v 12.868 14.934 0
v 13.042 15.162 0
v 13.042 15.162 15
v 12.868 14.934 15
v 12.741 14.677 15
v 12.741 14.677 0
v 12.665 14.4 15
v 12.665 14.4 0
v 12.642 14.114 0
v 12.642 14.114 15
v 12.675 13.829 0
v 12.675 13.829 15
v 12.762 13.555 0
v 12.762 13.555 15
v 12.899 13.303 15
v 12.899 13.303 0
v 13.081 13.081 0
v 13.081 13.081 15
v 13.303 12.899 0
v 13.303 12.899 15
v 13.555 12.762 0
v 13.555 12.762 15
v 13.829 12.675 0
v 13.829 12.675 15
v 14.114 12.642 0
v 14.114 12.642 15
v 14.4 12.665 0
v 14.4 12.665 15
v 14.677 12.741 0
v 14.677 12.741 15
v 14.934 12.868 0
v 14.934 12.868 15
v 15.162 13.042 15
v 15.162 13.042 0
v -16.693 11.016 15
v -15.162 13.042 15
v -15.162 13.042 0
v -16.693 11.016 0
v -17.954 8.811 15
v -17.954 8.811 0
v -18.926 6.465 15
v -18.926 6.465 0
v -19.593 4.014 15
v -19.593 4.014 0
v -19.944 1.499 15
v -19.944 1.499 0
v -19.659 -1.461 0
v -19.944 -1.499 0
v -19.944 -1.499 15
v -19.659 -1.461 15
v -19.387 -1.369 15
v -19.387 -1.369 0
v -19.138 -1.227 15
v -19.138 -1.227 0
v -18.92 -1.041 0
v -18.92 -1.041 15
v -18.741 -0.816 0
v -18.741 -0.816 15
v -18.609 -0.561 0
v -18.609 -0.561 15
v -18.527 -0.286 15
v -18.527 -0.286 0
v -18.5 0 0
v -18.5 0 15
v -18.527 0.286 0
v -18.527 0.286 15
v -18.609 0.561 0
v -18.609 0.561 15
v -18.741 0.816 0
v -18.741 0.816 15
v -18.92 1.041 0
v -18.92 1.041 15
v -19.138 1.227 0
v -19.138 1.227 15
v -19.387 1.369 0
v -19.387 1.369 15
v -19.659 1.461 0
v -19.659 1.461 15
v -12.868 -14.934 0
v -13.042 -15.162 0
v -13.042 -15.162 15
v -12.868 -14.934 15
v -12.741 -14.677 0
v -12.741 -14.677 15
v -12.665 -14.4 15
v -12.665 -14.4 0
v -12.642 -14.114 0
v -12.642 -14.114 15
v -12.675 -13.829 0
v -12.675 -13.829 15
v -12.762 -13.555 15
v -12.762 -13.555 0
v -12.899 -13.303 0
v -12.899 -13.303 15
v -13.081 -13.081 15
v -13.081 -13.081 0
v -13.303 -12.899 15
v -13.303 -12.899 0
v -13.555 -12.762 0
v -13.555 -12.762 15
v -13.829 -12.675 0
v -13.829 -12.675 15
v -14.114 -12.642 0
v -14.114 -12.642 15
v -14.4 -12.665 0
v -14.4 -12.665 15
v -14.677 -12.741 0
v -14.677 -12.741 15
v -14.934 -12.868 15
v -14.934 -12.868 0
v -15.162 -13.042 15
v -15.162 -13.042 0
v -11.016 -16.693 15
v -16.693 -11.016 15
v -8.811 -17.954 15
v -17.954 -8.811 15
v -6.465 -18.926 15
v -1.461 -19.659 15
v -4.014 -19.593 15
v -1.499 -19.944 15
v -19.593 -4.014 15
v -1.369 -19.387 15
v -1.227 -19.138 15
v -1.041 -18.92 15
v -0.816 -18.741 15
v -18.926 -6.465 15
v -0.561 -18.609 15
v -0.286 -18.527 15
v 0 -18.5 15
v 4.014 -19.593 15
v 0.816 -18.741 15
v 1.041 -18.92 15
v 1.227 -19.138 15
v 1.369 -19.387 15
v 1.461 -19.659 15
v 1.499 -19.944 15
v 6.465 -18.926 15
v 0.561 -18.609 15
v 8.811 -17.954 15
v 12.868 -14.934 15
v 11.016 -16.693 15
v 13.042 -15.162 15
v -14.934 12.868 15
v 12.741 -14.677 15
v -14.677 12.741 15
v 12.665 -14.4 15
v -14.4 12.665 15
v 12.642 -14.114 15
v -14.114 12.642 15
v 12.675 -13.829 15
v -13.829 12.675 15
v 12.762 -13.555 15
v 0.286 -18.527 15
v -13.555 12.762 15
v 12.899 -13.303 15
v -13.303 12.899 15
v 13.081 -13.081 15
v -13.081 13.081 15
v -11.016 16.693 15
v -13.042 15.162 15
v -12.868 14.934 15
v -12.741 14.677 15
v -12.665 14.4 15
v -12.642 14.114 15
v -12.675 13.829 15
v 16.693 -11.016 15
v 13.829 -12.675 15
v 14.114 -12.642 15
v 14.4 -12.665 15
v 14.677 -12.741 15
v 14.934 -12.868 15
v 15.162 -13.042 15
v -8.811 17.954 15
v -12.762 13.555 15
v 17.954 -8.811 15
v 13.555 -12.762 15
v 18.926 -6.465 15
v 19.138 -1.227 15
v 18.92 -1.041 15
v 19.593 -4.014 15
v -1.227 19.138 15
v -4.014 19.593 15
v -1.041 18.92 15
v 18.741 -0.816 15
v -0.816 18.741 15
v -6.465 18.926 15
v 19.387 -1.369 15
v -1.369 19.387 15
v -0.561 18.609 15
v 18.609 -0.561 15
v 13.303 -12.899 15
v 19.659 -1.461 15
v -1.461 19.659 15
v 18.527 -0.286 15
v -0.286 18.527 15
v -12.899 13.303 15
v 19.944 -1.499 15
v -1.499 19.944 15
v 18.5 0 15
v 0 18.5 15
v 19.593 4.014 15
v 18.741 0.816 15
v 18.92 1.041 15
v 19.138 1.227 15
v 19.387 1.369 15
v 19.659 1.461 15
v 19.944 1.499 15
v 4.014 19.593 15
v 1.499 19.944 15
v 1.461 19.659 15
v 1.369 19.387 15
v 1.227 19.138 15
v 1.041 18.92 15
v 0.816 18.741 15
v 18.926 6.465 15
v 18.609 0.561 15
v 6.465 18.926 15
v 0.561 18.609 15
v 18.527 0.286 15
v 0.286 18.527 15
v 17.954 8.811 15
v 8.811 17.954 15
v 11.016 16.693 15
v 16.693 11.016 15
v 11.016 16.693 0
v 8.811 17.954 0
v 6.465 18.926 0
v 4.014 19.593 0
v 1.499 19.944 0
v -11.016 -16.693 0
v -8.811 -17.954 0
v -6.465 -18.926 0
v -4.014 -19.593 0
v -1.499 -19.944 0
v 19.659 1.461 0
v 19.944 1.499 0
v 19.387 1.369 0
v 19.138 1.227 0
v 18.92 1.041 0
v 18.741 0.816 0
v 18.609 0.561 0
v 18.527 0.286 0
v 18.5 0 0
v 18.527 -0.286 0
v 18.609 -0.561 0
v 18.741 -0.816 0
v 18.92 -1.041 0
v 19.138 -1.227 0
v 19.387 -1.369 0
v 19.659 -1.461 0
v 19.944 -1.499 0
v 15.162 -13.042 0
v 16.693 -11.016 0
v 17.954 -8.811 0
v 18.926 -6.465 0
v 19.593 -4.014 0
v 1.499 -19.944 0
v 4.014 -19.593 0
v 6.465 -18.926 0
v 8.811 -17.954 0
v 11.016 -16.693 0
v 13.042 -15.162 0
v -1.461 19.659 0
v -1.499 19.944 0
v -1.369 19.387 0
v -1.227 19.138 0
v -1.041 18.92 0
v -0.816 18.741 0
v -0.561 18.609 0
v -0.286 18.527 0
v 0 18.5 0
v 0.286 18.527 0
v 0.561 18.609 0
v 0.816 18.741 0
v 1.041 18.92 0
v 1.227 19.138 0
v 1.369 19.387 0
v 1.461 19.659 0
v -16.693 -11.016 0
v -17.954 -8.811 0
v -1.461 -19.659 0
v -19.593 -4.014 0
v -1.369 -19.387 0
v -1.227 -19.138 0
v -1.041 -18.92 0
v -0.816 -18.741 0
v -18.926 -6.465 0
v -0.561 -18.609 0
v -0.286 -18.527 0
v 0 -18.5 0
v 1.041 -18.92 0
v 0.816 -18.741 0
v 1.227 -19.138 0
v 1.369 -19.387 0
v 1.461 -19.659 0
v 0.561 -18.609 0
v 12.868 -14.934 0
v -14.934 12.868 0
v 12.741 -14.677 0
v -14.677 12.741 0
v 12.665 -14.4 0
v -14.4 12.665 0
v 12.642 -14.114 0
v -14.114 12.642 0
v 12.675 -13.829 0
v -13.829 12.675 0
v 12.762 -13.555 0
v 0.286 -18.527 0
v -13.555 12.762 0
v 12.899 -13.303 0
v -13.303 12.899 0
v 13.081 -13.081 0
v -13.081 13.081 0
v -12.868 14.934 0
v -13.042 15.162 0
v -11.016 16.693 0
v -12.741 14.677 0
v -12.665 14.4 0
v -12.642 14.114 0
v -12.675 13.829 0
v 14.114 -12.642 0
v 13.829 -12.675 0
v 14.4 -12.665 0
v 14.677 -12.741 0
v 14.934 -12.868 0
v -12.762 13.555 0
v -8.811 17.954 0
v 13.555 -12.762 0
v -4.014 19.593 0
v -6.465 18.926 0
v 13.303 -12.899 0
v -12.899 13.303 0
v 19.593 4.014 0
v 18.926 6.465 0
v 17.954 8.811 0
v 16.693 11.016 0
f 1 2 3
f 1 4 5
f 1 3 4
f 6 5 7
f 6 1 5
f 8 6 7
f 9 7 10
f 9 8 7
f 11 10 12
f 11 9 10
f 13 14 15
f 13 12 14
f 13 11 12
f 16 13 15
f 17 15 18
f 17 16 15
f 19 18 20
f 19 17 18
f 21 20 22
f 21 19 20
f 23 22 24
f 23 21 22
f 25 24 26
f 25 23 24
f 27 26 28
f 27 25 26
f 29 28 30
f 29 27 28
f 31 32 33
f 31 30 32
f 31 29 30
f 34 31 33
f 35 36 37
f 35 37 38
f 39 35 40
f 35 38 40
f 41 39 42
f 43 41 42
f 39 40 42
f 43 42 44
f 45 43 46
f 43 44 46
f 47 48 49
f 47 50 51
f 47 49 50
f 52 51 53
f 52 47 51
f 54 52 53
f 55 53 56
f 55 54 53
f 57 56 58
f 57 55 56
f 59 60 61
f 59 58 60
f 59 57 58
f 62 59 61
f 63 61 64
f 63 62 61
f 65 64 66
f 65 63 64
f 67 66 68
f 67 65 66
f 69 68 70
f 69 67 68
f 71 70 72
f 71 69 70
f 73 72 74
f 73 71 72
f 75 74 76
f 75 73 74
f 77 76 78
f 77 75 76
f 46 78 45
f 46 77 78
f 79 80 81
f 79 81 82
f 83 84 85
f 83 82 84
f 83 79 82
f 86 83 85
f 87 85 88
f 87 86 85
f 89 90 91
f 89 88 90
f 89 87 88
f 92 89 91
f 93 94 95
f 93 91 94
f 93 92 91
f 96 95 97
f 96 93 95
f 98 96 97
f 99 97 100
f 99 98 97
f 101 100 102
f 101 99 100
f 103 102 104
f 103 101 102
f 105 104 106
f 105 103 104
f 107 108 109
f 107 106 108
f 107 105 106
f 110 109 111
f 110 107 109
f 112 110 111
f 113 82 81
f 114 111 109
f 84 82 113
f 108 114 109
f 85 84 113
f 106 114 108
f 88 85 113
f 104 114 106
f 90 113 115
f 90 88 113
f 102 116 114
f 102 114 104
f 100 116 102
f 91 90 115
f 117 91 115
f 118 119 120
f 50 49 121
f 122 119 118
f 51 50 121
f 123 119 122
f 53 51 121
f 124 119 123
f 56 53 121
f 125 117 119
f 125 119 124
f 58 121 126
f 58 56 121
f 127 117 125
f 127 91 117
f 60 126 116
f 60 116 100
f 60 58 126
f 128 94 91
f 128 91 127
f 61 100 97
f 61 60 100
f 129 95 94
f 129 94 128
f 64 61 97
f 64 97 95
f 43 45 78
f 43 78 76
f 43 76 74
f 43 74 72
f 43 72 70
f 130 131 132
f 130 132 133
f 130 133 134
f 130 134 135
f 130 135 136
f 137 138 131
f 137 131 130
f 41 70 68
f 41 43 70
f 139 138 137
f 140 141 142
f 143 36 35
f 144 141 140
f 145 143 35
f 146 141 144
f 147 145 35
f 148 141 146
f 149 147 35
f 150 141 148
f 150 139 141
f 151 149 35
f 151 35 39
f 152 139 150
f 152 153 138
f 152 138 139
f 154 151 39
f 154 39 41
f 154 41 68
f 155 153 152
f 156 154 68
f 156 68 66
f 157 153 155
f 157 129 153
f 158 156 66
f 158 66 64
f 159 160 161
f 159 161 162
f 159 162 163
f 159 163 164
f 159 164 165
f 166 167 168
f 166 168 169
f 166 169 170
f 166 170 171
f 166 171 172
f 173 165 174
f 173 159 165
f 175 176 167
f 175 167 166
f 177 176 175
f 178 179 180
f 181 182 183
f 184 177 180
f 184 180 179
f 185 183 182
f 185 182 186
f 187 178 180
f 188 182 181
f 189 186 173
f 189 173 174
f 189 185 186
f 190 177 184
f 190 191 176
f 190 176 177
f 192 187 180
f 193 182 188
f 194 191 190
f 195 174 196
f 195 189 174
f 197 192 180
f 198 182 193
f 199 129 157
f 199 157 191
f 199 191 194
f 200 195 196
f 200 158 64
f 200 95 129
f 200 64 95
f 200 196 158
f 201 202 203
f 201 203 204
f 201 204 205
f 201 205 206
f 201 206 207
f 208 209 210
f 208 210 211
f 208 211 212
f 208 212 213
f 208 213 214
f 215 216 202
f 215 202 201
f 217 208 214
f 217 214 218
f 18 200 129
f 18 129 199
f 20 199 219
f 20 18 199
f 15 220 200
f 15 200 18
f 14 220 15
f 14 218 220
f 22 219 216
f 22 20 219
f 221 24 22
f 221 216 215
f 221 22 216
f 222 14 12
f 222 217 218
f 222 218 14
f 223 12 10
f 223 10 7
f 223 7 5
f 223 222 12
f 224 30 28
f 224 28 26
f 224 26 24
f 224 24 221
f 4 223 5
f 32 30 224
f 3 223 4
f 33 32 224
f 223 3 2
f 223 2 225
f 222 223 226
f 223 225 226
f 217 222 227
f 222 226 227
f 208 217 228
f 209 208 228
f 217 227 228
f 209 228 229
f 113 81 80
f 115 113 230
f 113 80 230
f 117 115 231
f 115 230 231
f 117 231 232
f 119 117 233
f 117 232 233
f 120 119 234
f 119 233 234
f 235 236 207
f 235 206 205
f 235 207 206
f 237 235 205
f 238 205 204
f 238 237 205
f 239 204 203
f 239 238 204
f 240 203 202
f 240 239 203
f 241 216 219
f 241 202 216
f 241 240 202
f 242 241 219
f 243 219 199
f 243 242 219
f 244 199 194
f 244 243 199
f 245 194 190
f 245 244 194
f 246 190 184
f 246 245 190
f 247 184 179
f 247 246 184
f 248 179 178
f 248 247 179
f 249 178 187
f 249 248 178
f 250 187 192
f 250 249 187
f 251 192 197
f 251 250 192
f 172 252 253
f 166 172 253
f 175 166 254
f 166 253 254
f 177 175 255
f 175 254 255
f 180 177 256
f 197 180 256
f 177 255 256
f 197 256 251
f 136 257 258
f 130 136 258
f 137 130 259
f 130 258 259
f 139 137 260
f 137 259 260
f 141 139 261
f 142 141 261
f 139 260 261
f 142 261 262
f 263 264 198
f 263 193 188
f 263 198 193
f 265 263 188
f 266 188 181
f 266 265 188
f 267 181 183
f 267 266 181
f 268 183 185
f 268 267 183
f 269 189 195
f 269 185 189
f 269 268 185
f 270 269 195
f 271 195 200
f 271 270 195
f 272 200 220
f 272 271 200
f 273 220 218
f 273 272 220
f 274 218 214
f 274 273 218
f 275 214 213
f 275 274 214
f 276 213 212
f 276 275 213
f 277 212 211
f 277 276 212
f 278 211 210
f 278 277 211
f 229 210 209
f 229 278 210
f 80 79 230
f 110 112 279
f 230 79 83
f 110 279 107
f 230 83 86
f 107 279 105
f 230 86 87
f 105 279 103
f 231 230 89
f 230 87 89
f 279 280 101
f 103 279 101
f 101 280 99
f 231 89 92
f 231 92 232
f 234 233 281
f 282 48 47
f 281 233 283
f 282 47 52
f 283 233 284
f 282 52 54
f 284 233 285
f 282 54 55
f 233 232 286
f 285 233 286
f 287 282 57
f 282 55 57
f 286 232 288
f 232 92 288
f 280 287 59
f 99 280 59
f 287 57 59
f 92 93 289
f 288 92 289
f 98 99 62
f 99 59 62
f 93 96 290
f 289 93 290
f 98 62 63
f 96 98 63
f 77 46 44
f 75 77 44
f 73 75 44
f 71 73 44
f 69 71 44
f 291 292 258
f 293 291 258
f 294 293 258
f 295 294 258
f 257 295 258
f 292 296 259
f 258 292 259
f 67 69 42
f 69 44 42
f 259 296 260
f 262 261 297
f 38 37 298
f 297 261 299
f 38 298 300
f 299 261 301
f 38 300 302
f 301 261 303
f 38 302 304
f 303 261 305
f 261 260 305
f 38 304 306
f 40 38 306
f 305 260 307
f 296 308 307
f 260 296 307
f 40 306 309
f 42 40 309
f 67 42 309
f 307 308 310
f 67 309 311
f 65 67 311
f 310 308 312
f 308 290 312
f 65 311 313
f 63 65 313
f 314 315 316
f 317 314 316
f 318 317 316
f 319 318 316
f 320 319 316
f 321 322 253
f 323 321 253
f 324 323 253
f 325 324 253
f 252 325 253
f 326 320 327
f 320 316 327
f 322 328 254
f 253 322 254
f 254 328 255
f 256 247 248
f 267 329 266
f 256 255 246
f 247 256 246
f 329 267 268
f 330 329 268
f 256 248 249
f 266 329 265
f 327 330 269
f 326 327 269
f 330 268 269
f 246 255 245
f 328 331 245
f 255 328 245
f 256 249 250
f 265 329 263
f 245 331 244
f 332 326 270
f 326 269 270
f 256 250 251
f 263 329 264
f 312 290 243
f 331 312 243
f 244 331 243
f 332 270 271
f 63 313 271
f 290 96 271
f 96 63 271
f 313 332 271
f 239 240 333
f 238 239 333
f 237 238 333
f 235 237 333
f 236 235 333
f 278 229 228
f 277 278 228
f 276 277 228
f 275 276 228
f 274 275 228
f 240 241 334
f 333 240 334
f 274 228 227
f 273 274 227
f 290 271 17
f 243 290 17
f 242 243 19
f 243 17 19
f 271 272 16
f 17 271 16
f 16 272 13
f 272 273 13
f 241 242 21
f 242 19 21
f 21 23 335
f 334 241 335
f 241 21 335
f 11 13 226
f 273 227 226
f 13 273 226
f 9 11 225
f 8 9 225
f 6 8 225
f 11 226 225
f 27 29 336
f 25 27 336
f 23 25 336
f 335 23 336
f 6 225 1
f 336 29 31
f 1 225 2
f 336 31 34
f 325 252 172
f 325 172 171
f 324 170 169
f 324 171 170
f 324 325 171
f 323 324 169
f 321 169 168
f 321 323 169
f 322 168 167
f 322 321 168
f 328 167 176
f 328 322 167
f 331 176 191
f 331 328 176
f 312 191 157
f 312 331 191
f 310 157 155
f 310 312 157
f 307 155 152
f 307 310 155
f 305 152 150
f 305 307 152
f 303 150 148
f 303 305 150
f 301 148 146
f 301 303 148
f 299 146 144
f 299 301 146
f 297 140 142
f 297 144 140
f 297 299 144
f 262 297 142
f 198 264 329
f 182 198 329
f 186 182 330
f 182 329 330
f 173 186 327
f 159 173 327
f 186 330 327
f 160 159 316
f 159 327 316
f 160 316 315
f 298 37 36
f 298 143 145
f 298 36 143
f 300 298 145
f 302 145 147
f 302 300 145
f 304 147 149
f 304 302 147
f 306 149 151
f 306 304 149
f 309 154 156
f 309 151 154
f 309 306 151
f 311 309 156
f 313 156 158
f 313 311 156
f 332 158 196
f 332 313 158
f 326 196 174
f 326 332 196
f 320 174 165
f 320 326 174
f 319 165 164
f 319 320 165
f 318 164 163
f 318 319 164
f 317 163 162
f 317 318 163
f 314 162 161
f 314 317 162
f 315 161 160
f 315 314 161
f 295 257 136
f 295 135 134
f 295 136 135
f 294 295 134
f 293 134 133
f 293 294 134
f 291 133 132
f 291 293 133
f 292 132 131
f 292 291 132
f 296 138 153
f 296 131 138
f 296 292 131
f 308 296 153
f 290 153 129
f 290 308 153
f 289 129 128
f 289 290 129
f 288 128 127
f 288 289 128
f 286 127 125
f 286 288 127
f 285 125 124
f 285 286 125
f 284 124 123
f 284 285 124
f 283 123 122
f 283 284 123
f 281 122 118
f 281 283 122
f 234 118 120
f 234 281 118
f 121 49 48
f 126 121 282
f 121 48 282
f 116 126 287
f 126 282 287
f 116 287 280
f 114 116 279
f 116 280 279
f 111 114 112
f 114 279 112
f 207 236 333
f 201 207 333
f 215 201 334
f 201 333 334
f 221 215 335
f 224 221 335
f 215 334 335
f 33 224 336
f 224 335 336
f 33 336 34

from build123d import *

# Parameters (mm, degrees)
CYLINDER001_R     = 1.5
CYLINDER001_DEPTH = 20
ARRAY_COUNT       = 8
CYLINDER_R        = 20
CYLINDER_DEPTH    = 15


with BuildPart() as array:
    # Cylinder001 → Cylinder001 (new body)
    with BuildSketch(Plane(origin=(20, 0, -2), x_dir=(1, 0, 0), z_dir=(0, 0, 1))):
        Circle(CYLINDER001_R)
    extrude(amount=CYLINDER001_DEPTH)

    # Array: Array ×8 about axis
    array_axis = Axis((0, 0, 0), (0, 0, 1))


with BuildPart() as array_1:
    add(array.part)
    for i in range(1, ARRAY_COUNT):
        add(array.part.rotate(array_axis, i * 360 / ARRAY_COUNT))


with BuildPart() as cut:
    # Cylinder → Cylinder (new body)
    with BuildSketch(Plane.XY):
        Circle(CYLINDER_R)
    extrude(amount=CYLINDER_DEPTH)

    # Cut: cut Array
    add(array_1.part, mode=Mode.SUBTRACT)


solid = cut.part
